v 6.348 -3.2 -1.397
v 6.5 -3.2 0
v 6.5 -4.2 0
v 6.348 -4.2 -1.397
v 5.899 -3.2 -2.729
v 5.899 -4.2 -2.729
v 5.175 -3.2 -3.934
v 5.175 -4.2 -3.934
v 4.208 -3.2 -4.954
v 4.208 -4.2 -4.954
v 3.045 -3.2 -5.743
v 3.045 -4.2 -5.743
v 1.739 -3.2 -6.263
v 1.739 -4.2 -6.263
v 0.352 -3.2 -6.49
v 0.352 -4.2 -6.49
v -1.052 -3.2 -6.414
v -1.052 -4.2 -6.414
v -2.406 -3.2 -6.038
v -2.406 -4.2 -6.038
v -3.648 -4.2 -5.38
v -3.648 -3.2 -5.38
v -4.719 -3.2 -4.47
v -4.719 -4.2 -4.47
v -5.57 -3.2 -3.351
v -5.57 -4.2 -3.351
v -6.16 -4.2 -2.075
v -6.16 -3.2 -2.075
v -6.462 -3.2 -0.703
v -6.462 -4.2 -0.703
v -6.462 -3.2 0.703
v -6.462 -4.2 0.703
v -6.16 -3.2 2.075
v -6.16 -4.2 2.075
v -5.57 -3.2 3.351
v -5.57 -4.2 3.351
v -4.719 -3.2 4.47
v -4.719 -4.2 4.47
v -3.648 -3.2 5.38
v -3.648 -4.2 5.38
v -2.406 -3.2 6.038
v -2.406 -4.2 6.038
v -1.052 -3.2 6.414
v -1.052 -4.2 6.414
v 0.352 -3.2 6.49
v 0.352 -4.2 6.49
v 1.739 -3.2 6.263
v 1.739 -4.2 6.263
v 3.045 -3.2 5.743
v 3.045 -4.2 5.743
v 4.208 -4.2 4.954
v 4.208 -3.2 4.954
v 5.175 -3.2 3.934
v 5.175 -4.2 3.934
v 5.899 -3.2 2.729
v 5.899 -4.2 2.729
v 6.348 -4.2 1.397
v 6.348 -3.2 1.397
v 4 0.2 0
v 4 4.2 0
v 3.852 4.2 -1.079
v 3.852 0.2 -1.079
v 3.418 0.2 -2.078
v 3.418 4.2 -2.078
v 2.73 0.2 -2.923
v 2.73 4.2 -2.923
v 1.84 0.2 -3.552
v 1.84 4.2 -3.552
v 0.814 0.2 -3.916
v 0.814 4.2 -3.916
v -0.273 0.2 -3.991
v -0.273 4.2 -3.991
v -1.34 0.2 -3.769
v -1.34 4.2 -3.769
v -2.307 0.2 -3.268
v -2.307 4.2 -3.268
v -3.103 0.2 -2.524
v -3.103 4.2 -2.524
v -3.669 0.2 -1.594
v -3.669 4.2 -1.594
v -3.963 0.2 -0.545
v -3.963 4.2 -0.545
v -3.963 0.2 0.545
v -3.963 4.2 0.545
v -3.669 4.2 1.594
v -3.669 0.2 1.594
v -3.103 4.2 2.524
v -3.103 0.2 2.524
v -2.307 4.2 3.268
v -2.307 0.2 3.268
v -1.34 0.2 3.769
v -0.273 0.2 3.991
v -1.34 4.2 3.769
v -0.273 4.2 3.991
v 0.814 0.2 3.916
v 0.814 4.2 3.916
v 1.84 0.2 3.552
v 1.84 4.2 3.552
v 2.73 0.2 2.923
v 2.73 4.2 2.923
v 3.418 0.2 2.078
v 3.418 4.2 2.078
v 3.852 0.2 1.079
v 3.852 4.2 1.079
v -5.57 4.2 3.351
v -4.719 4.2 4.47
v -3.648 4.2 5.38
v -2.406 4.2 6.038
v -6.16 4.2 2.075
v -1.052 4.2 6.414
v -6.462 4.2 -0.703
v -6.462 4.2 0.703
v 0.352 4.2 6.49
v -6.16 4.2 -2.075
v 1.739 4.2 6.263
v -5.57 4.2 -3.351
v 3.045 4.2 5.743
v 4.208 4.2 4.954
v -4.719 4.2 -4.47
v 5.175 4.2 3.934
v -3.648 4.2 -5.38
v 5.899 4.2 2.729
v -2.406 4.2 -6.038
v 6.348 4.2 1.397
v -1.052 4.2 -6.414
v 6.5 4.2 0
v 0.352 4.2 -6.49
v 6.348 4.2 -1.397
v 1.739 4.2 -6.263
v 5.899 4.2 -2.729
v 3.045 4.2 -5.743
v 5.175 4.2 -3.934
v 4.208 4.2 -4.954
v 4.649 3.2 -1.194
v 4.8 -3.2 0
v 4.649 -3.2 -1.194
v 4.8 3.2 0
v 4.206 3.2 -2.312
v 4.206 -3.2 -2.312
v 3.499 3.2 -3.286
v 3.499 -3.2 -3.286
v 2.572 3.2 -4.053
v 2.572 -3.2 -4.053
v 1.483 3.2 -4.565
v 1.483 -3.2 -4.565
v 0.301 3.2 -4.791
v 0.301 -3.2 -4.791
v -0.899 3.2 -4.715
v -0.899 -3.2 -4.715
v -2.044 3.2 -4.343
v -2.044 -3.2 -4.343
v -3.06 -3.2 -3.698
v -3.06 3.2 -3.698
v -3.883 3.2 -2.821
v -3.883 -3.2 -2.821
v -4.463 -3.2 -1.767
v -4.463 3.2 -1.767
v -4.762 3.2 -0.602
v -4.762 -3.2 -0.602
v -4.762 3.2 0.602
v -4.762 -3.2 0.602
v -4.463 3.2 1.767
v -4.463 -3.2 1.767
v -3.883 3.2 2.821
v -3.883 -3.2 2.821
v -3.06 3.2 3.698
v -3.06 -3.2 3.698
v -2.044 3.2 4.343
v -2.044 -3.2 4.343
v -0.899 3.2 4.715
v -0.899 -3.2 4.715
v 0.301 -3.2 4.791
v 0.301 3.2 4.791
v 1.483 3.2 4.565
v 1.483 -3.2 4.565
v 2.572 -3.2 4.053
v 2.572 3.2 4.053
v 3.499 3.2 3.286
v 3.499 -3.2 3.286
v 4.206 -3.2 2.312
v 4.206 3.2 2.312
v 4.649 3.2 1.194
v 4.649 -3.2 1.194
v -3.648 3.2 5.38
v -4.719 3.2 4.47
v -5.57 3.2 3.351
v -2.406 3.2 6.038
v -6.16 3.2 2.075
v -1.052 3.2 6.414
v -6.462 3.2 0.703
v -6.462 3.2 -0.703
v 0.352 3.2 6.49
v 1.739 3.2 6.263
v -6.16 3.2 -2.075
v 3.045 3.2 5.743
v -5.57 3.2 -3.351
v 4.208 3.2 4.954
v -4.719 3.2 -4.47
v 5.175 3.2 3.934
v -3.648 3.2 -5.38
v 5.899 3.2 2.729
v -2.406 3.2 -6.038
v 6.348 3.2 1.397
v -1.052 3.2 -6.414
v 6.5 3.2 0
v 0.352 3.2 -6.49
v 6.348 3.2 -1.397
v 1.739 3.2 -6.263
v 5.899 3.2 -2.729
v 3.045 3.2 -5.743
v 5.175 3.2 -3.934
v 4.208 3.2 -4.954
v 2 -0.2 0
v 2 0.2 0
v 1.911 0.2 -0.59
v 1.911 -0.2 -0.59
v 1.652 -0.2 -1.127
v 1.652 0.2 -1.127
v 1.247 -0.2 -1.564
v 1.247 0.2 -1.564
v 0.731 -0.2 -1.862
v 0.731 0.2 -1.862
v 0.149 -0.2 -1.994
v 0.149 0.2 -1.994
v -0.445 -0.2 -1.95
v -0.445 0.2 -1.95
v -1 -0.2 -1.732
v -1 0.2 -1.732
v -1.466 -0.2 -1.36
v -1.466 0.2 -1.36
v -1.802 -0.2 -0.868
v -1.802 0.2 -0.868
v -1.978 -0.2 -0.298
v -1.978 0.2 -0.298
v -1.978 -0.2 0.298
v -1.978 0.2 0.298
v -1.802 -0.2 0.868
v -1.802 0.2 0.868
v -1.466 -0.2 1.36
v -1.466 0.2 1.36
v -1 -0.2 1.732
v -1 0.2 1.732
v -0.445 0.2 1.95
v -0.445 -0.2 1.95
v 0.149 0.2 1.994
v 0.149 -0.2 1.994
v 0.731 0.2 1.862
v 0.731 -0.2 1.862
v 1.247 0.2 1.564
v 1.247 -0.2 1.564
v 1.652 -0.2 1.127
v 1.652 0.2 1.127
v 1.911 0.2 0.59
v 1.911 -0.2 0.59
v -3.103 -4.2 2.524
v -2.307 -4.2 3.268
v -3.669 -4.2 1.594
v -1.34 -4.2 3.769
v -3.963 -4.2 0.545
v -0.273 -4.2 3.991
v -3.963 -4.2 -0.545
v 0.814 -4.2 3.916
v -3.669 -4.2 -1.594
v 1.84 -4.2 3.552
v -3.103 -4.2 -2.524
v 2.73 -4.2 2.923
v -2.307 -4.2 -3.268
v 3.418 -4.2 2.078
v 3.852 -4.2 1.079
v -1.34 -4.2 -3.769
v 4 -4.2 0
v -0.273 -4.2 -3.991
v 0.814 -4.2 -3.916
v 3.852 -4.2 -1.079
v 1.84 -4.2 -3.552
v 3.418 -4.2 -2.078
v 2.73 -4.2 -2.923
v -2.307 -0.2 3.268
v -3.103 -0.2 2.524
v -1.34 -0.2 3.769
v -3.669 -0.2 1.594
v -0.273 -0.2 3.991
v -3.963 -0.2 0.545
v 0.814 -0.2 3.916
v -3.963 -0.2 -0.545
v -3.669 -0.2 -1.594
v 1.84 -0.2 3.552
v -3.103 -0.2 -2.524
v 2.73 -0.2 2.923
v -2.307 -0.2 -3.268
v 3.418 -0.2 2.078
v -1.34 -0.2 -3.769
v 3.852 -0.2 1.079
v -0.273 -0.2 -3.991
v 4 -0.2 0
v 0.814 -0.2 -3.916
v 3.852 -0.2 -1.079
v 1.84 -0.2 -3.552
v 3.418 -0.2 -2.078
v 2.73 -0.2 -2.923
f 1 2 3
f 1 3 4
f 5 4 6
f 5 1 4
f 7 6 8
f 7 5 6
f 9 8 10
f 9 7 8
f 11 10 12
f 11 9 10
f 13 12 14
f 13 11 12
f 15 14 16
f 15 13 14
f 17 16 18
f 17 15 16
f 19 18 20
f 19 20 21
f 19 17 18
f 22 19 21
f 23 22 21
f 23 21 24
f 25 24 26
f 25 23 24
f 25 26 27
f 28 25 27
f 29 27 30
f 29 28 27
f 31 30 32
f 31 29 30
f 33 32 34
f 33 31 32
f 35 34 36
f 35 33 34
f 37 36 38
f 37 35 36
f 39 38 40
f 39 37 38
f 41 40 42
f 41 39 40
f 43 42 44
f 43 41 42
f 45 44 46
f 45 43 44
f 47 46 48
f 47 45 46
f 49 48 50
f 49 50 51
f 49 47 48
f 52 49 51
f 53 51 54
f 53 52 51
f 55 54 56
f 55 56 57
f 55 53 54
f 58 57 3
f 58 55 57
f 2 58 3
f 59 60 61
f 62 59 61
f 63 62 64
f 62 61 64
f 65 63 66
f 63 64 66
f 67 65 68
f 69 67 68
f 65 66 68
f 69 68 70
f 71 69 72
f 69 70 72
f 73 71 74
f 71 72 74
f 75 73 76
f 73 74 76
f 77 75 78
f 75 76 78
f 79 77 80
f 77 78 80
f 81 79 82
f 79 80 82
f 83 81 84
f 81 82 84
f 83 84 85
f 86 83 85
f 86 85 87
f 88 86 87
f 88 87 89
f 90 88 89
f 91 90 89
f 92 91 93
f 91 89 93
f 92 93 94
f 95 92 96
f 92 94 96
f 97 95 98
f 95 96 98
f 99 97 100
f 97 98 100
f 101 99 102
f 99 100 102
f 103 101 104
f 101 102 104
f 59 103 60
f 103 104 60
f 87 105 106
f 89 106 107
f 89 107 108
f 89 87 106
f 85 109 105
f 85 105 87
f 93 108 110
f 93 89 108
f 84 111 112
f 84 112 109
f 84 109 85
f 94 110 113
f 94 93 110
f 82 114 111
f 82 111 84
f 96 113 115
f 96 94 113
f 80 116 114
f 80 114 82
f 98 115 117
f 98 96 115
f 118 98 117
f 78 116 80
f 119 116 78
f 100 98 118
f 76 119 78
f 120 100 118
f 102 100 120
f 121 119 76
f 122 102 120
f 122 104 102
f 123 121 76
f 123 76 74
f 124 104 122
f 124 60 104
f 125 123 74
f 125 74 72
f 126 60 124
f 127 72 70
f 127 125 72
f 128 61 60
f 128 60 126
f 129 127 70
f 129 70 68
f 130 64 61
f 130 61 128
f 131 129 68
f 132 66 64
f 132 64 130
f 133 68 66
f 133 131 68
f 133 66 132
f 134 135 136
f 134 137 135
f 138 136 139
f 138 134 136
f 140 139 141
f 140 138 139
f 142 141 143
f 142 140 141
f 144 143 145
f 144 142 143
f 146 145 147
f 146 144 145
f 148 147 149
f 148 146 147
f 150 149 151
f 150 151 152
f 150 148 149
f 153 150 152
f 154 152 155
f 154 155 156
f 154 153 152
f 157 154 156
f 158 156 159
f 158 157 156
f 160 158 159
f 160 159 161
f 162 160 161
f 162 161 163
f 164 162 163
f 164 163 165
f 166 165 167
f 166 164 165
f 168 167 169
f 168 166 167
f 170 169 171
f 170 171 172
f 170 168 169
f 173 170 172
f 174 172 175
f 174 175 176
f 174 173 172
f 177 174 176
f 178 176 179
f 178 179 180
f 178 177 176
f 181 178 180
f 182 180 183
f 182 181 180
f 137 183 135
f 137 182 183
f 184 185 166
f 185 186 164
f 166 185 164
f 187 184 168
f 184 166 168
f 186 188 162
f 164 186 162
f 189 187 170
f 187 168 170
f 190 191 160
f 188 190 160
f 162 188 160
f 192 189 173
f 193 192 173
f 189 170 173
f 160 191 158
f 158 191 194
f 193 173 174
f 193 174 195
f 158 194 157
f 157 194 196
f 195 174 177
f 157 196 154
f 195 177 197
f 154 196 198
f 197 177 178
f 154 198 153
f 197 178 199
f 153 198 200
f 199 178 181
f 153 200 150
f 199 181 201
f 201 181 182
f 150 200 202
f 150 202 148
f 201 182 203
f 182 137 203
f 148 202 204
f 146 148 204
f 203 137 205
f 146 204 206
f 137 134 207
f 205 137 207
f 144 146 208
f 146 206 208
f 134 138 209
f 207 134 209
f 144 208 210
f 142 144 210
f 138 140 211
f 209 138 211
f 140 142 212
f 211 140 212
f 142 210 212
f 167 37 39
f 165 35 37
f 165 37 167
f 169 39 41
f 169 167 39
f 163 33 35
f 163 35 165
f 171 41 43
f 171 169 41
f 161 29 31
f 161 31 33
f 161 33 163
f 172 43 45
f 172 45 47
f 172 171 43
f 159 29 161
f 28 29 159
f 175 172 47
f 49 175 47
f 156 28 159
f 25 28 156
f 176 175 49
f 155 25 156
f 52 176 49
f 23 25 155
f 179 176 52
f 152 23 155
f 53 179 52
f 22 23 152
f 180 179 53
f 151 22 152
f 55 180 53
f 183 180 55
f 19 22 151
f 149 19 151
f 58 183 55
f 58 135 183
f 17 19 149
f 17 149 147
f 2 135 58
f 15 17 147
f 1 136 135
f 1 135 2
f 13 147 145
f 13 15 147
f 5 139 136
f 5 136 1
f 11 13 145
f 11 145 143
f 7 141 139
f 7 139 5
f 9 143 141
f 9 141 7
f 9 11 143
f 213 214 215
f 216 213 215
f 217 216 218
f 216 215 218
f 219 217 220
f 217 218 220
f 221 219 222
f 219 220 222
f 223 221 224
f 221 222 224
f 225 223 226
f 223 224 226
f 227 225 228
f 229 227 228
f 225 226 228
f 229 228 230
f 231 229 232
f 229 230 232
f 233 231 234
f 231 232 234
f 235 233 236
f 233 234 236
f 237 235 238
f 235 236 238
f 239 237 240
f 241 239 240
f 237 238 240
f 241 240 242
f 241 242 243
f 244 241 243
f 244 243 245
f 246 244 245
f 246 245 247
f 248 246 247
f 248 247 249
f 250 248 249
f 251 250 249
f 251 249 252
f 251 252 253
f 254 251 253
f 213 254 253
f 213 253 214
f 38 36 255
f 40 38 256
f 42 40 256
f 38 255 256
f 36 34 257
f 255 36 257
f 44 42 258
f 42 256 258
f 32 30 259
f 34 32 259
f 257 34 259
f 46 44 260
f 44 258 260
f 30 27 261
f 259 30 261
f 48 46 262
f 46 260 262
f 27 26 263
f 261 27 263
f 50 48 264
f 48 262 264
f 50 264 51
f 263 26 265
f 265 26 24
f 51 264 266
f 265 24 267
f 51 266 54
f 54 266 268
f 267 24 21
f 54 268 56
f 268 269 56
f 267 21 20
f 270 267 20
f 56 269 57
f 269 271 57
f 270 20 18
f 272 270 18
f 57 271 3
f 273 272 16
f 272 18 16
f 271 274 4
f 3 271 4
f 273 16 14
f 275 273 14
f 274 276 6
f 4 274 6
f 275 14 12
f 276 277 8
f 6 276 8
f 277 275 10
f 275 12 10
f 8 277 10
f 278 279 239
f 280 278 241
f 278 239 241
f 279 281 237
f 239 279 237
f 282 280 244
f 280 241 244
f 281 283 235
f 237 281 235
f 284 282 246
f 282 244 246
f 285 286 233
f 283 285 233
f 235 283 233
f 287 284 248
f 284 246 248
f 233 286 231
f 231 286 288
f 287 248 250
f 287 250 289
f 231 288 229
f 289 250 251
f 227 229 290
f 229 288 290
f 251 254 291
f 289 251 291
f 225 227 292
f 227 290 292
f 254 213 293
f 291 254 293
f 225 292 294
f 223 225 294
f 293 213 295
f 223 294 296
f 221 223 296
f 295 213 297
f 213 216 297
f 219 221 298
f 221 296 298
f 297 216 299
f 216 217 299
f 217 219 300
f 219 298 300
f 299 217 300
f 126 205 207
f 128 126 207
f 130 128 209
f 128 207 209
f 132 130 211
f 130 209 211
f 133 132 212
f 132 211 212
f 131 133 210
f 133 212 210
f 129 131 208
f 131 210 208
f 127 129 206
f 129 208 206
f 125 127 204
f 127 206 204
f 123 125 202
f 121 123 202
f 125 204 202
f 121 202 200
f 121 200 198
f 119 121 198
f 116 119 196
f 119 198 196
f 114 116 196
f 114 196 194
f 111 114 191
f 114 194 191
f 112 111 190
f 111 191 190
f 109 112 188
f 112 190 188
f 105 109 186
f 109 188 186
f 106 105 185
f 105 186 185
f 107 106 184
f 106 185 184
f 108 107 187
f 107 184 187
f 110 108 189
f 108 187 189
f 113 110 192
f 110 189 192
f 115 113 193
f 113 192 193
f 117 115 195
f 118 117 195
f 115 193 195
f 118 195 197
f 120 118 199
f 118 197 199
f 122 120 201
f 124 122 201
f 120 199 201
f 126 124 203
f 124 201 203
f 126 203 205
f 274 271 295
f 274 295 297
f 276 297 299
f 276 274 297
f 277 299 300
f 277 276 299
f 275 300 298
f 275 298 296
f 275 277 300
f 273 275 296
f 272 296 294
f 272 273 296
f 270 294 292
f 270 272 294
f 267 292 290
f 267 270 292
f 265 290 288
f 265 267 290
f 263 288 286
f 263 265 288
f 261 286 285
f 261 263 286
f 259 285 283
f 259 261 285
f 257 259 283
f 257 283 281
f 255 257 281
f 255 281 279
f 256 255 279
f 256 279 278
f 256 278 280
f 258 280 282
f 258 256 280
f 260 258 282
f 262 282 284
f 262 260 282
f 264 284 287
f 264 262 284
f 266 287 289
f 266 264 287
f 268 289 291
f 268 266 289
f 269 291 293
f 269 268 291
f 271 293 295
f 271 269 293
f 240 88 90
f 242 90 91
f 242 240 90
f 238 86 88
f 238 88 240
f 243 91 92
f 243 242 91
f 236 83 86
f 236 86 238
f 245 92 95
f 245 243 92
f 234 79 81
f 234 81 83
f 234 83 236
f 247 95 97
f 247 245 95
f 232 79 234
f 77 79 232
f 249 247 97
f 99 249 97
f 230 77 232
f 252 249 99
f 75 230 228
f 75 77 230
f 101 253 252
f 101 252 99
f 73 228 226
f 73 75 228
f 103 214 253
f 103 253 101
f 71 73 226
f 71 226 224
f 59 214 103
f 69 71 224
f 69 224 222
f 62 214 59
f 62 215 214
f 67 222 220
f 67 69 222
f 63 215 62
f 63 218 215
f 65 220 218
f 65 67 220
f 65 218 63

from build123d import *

# Parameters (mm, degrees)
BASES_R        = 4.8
BASE_DEPTH     = 3.2
FLANGES_R      = 6.5
FLANGE_DEPTH   = 1
TOPBORES_R     = 4
TOPBORE_DEPTH  = 4
THRUHOLES_R    = 2
THRUHOLE_DEPTH = 5.4


with BuildPart() as part:
    # BaseS → Base (new body, symmetric)
    with BuildSketch(Plane(origin=(0, 0, 0), x_dir=(1, 0, 0), z_dir=(0, 1, 0))):
        Circle(BASES_R)
    extrude(amount=BASE_DEPTH, both=True)

    # FlangeS → Flange (add)
    with BuildSketch(Plane(origin=(0, 3.2, 0), x_dir=(1, 0, 0), z_dir=(0, 1, 0))):
        Circle(FLANGES_R)
    flange = extrude(amount=FLANGE_DEPTH)

    # TopBoreS → TopBore (cut)
    with BuildSketch(Plane(origin=(0, 4.2, 0), x_dir=(1, 0, 0), z_dir=(0, 1, 0))):
        Circle(TOPBORES_R)
    topbore = extrude(amount=-TOPBORE_DEPTH, mode=Mode.SUBTRACT)

    # BoreVM: Flange, TopBore across plane
    add(flange.mirror(Plane.ZX))
    add(topbore.mirror(Plane.ZX), mode=Mode.SUBTRACT)

    # ThruHoleS → ThruHole (cut, through all)
    with BuildSketch(Plane(origin=(0, 0.2, 0), x_dir=(1, 0, 0), z_dir=(0, 1, 0))):
        Circle(THRUHOLES_R)
    extrude(amount=-THRUHOLE_DEPTH, mode=Mode.SUBTRACT)


solid = part.part
